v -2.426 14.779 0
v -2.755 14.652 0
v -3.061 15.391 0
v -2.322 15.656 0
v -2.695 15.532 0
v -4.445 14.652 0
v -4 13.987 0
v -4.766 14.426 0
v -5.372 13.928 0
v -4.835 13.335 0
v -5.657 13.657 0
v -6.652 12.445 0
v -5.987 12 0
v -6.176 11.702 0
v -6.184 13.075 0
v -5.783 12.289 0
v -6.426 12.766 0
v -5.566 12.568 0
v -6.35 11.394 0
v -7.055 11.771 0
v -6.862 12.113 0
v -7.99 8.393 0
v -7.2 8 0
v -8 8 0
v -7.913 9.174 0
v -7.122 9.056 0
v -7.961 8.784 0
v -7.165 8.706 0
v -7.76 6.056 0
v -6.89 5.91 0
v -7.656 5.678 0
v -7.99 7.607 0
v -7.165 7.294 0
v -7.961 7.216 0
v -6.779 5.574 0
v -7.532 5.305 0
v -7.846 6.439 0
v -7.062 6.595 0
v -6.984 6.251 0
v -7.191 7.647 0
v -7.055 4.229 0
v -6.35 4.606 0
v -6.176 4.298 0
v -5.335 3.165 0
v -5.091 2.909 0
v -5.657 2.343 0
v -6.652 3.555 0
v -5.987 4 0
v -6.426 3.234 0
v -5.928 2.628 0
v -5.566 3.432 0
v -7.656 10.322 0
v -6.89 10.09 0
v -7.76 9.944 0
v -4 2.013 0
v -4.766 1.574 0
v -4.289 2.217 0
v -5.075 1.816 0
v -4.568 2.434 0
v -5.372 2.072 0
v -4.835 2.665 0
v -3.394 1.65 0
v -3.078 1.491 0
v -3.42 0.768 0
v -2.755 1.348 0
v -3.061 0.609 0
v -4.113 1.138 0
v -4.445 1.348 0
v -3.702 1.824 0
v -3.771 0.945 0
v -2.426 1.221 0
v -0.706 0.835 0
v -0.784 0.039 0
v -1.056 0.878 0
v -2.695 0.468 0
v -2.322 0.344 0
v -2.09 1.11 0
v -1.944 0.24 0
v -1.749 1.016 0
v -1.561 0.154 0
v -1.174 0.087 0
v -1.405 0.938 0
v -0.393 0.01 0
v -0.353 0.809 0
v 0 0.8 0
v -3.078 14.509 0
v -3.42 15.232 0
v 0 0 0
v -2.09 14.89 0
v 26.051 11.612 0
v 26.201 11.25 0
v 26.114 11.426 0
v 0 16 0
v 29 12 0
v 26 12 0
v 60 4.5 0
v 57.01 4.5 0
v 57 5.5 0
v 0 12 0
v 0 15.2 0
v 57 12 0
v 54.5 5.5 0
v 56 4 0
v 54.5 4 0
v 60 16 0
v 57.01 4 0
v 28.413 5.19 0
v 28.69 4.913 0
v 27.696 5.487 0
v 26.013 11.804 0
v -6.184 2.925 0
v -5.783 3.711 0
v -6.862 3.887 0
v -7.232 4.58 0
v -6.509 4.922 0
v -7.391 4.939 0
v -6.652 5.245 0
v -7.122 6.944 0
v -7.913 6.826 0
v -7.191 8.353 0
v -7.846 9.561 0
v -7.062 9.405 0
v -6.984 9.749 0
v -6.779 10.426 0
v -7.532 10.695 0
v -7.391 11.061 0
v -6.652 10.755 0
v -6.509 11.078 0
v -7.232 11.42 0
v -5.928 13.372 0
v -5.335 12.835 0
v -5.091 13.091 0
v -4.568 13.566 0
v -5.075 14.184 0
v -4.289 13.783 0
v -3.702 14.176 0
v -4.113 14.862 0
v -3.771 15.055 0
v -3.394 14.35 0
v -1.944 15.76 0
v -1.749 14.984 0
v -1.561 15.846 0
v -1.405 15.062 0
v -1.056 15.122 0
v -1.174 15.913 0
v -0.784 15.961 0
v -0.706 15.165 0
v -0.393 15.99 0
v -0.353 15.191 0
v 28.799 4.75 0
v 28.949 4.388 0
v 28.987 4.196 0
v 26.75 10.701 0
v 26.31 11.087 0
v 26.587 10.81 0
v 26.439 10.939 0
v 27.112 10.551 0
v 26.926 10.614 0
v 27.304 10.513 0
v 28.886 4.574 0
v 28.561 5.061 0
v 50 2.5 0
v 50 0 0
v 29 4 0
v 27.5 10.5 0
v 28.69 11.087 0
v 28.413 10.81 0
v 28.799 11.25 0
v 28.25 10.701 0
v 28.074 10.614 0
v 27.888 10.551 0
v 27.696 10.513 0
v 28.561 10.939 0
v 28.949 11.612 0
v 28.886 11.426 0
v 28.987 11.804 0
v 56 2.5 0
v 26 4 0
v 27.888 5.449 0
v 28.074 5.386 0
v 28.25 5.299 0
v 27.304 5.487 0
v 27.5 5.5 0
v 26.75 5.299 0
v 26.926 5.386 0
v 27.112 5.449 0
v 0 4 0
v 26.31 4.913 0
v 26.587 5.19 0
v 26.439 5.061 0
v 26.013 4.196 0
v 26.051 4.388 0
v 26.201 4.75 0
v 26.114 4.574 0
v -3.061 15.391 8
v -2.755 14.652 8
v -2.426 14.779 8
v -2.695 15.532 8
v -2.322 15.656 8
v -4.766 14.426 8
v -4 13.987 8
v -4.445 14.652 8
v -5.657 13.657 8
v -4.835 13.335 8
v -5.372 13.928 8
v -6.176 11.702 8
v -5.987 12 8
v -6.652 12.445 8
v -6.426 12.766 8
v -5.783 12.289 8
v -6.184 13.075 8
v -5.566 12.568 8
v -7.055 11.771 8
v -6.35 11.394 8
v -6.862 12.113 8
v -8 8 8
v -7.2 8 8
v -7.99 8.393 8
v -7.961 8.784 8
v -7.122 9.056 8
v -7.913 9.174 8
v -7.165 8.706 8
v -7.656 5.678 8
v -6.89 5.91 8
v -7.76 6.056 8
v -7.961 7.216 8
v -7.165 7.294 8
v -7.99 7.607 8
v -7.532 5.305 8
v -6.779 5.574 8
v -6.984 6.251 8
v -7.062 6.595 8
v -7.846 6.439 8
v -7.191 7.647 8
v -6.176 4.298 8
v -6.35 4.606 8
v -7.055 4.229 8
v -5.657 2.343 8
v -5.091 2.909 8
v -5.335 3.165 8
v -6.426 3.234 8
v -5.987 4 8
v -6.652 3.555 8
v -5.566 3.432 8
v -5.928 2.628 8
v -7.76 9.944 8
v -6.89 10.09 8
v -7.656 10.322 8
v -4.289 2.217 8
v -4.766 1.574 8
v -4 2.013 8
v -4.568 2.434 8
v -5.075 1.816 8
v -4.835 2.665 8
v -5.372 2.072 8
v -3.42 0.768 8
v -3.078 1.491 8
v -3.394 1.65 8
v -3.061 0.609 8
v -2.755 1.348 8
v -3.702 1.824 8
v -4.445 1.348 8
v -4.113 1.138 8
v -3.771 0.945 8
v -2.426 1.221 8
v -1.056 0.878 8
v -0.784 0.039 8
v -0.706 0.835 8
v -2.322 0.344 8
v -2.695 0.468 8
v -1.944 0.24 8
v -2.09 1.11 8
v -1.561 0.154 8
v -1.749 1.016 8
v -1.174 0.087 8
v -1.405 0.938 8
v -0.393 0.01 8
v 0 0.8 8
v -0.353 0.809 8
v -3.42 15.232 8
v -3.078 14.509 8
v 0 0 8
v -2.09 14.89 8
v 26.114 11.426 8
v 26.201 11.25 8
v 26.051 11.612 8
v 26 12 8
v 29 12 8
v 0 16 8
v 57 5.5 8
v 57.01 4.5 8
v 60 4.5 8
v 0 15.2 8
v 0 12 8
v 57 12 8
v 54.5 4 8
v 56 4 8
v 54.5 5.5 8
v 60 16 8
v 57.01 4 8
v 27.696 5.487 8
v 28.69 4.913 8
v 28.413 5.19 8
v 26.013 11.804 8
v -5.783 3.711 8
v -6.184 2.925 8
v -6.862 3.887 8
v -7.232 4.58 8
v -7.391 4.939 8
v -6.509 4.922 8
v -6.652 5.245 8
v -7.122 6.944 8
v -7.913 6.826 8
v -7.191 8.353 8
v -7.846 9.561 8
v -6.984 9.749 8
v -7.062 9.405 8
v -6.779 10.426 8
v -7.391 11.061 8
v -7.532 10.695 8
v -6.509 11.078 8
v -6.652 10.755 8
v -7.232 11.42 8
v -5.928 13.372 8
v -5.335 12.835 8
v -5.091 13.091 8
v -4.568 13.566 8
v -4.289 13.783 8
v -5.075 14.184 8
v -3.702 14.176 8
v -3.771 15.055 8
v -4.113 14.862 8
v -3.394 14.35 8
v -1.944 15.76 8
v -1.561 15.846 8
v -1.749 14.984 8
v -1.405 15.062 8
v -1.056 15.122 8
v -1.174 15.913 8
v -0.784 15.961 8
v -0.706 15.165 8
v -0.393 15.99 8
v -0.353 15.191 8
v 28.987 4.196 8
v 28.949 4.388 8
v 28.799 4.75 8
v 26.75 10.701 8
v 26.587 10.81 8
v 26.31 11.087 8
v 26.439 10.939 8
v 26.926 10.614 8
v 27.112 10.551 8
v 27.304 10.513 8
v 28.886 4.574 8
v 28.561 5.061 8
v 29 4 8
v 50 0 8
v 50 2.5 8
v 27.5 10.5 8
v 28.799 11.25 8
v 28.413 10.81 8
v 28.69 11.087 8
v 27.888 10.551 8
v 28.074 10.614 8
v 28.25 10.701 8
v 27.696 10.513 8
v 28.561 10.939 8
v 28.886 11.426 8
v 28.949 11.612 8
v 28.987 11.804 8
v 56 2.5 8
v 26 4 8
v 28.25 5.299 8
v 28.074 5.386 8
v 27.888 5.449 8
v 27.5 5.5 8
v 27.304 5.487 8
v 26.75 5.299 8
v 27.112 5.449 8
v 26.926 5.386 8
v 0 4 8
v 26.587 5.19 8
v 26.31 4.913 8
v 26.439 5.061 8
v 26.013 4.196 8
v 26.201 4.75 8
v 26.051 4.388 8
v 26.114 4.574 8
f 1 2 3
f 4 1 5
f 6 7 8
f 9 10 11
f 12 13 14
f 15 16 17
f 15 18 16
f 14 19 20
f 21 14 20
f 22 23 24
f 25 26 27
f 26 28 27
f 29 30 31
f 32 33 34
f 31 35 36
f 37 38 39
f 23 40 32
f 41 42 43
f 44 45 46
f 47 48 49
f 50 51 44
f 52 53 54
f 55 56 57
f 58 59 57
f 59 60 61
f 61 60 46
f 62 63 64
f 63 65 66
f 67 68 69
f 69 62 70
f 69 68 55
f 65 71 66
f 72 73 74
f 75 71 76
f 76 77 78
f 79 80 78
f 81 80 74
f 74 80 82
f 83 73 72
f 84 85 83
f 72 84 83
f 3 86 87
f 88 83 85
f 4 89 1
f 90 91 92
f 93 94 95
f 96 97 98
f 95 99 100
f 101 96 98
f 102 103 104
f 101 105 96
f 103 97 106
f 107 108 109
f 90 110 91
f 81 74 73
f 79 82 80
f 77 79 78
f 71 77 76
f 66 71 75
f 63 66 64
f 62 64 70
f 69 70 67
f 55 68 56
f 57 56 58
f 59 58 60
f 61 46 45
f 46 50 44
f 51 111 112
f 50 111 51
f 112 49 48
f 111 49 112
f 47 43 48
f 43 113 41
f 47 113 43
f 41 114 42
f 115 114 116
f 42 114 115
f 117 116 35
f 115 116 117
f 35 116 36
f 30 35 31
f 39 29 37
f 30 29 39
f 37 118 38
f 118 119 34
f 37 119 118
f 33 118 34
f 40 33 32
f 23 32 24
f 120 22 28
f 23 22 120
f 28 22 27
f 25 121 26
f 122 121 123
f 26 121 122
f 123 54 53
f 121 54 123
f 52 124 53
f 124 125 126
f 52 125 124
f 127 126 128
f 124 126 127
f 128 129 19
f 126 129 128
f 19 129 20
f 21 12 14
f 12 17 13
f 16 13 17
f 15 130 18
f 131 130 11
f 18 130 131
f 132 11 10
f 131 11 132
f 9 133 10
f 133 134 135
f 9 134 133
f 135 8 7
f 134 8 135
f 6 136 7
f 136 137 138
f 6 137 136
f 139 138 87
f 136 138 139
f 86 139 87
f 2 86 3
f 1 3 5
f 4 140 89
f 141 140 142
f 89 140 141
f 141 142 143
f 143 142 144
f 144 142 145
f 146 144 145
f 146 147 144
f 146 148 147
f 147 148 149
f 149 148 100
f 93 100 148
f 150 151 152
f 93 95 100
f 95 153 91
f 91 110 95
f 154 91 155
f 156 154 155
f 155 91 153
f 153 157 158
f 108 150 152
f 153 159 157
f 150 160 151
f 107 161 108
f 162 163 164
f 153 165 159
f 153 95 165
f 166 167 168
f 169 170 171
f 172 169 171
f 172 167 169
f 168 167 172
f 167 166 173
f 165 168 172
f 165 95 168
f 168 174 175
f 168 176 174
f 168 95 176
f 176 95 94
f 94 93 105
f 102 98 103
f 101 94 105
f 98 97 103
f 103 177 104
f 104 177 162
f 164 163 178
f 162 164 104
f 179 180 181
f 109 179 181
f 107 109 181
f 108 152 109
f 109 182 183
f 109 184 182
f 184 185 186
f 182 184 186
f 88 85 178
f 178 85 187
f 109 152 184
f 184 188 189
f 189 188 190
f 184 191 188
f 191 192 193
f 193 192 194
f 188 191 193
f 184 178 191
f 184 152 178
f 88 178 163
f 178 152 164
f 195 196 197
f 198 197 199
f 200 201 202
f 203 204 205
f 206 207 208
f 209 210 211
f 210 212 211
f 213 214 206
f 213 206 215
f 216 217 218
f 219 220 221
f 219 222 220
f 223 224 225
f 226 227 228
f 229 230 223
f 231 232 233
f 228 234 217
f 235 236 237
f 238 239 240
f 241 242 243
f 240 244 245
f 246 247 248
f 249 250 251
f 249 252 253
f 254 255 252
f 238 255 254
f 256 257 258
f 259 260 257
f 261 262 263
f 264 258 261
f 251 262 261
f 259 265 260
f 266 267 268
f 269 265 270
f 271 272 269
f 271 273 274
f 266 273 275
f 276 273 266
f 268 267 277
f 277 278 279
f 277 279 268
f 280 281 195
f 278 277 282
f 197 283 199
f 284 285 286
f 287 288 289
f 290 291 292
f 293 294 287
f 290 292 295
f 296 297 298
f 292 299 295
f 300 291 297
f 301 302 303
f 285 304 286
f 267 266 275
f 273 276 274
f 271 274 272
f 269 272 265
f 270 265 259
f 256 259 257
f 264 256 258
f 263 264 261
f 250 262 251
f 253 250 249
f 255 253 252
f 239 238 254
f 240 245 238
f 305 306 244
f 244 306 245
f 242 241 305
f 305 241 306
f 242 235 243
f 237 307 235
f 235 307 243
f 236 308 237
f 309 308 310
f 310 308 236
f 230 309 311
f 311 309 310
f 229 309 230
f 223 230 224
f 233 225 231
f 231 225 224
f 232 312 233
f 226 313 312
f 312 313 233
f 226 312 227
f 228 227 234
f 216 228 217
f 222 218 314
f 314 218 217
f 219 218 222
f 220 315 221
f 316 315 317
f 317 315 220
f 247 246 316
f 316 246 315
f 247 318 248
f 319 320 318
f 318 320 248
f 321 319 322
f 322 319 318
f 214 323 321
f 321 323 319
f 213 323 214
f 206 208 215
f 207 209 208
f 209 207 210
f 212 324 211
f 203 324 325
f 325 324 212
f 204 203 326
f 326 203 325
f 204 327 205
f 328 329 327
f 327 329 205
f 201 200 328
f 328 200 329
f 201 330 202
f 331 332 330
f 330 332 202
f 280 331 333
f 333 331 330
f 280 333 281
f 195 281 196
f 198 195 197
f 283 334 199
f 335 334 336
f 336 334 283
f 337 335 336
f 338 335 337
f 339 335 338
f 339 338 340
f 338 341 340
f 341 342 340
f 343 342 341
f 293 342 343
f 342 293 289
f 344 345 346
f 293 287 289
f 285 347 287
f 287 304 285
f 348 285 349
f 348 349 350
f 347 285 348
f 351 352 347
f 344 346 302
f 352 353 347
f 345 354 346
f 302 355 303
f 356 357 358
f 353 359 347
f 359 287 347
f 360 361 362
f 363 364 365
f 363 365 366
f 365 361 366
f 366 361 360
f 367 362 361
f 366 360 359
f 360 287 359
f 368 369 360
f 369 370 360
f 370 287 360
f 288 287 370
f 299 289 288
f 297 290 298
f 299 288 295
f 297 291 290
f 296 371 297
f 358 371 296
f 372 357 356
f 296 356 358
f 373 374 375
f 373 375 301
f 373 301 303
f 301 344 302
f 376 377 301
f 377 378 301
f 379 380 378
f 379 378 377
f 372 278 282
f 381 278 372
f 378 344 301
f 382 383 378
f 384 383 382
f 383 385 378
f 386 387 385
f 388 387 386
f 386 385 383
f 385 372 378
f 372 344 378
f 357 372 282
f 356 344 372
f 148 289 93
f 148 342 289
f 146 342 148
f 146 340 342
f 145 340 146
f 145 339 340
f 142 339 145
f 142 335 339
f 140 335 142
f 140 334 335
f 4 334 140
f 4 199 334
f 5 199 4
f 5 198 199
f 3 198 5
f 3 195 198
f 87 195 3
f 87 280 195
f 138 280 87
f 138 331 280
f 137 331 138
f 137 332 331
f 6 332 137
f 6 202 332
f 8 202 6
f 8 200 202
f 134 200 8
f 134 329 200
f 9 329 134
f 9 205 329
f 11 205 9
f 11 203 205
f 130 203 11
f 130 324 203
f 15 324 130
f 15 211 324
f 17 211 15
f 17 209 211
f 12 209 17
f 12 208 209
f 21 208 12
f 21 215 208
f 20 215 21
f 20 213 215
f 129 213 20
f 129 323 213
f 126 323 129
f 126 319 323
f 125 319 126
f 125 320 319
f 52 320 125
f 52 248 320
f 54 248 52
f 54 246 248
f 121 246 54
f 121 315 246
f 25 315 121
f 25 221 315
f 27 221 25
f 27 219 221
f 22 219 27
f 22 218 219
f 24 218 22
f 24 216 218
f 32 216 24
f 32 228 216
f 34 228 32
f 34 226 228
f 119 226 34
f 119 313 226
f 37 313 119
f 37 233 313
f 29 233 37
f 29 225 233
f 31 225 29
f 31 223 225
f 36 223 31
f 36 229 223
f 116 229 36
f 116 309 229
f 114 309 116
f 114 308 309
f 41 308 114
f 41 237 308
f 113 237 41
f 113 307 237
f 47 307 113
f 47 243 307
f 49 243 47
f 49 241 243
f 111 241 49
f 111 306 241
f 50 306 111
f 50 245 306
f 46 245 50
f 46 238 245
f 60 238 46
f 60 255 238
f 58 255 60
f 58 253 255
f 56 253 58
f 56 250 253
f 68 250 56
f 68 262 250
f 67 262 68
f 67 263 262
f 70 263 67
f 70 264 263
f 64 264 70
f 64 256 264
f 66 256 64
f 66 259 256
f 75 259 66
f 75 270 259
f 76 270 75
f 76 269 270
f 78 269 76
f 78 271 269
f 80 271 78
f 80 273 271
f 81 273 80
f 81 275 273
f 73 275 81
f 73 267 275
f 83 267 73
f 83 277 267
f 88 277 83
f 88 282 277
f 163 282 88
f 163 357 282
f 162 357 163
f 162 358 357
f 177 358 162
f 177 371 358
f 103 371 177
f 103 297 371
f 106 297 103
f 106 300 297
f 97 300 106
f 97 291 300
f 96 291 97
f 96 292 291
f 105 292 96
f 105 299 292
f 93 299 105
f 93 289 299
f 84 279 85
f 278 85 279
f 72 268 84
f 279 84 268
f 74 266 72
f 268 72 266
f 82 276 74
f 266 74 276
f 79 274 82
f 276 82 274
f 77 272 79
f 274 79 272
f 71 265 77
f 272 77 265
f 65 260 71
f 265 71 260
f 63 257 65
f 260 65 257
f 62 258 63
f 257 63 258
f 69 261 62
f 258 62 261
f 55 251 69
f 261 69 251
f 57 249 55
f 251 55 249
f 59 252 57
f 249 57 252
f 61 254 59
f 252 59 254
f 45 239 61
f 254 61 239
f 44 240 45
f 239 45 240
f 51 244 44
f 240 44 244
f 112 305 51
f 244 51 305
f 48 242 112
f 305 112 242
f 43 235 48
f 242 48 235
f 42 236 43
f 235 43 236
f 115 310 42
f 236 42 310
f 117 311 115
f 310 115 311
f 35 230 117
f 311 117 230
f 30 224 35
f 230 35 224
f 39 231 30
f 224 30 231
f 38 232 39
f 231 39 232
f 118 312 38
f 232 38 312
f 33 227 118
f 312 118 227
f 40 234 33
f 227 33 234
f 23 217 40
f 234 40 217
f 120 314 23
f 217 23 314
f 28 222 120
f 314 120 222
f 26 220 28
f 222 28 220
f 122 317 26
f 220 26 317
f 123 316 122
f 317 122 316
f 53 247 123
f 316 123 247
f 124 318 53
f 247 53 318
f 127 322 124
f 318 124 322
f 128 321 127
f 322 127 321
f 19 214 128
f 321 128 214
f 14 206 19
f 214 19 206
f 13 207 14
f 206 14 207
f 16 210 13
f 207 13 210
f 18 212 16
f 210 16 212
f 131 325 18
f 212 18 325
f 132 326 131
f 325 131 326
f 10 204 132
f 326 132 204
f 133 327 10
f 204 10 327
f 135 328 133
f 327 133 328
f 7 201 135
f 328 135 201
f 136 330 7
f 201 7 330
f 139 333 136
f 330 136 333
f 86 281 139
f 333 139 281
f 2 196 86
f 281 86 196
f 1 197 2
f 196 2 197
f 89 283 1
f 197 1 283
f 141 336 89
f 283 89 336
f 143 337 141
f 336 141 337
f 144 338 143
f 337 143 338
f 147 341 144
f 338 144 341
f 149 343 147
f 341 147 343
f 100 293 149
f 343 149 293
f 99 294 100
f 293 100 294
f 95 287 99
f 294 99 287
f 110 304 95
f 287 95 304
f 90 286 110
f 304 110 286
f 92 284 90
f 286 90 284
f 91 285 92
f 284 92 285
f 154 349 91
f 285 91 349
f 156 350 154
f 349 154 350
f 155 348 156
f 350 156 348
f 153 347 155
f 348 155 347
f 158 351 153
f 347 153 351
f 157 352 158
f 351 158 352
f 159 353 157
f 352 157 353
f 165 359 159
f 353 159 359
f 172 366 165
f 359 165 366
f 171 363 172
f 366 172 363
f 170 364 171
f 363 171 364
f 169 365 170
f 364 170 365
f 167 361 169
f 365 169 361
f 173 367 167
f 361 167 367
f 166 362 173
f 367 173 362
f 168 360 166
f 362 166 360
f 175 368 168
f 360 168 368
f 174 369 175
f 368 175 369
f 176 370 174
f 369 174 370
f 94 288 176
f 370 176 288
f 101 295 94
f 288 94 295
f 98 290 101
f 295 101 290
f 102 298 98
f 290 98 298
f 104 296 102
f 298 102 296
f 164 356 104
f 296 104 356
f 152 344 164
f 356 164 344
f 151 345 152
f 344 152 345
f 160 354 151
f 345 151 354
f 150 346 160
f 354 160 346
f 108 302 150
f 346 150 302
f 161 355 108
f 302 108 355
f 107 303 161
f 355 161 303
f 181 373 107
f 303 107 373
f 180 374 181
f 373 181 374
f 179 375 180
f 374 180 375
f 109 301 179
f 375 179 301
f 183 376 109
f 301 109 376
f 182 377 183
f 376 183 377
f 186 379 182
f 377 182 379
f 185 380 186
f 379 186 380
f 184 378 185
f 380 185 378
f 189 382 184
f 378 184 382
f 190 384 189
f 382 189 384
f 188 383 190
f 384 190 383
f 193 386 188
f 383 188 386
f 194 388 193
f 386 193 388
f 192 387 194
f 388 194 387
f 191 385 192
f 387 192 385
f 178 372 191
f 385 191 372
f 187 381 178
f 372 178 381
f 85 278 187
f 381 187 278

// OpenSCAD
// KNOWN-WRONG PART (must fail): the nose reaches down to y = 4 and fuses with the tongue (the latch cannot open)
// Pinch clamp for silicone tubing (up to 6.4 mm OD) with a living hinge and a snap latch
// Category: quick fixes. One flat profile: two jaws joined by a 0.8 mm half-ring hinge, a
// half-round pinch ridge on each jaw, and a hook on the upper jaw whose nose snaps under the
// lower jaw's thin tongue when the jaws are squeezed together.
// Print: PETG or PP (PLA hinges crack), lying flat, 0.2 mm layers, 100 % infill.
// SPDX-License-Identifier: CERN-OHL-P-2.0

/* [Clamp] */
thickness = 8;            // extrusion along Z
lower_jaw = [50, 4];      // x 0..50, y 0..4
tongue = [50, 56, 2.5];   // x from, x to, y bottom (top at y = 4)
upper_jaw = [60, 12, 16]; // x 0..60, y 12..16
hinge_c = [0, 8];         // half-ring on the x < 0 side
hinge_r = [7.2, 8];       // inner, outer radius (0.8 mm thick)
ridge_x = 27.5;
ridge_r = 1.5;
leg = [57, 60, 4.5, 12];  // hook leg x from, x to, y from, y to
nose = [54.5, 57, 4, 5.5];  

/* [Hidden] */
eps = 0.01;

linear_extrude(thickness) union() {
    square(lower_jaw);
    translate([tongue[0], tongue[2]]) square([tongue[1] - tongue[0], lower_jaw.y - tongue[2]]);
    translate([0, upper_jaw[1]]) square([upper_jaw[0], upper_jaw[2] - upper_jaw[1]]);
    intersection() {
        translate(hinge_c) difference() { circle(r = hinge_r[1], $fn = 128); circle(r = hinge_r[0], $fn = 128); }
        translate([-hinge_r[1] - 1, -1]) square([hinge_r[1] + 1 + eps, 2 * hinge_r[1] + 2]);
    }
    translate([ridge_x, lower_jaw.y]) circle(r = ridge_r, $fn = 48);
    translate([ridge_x, upper_jaw[1]]) circle(r = ridge_r, $fn = 48);
    translate([leg[0], leg[2]]) square([leg[1] - leg[0], leg[3] - leg[2] + eps]);
    translate([nose[0], nose[2]]) square([nose[1] - nose[0] + eps, nose[3] - nose[2]]);
}
